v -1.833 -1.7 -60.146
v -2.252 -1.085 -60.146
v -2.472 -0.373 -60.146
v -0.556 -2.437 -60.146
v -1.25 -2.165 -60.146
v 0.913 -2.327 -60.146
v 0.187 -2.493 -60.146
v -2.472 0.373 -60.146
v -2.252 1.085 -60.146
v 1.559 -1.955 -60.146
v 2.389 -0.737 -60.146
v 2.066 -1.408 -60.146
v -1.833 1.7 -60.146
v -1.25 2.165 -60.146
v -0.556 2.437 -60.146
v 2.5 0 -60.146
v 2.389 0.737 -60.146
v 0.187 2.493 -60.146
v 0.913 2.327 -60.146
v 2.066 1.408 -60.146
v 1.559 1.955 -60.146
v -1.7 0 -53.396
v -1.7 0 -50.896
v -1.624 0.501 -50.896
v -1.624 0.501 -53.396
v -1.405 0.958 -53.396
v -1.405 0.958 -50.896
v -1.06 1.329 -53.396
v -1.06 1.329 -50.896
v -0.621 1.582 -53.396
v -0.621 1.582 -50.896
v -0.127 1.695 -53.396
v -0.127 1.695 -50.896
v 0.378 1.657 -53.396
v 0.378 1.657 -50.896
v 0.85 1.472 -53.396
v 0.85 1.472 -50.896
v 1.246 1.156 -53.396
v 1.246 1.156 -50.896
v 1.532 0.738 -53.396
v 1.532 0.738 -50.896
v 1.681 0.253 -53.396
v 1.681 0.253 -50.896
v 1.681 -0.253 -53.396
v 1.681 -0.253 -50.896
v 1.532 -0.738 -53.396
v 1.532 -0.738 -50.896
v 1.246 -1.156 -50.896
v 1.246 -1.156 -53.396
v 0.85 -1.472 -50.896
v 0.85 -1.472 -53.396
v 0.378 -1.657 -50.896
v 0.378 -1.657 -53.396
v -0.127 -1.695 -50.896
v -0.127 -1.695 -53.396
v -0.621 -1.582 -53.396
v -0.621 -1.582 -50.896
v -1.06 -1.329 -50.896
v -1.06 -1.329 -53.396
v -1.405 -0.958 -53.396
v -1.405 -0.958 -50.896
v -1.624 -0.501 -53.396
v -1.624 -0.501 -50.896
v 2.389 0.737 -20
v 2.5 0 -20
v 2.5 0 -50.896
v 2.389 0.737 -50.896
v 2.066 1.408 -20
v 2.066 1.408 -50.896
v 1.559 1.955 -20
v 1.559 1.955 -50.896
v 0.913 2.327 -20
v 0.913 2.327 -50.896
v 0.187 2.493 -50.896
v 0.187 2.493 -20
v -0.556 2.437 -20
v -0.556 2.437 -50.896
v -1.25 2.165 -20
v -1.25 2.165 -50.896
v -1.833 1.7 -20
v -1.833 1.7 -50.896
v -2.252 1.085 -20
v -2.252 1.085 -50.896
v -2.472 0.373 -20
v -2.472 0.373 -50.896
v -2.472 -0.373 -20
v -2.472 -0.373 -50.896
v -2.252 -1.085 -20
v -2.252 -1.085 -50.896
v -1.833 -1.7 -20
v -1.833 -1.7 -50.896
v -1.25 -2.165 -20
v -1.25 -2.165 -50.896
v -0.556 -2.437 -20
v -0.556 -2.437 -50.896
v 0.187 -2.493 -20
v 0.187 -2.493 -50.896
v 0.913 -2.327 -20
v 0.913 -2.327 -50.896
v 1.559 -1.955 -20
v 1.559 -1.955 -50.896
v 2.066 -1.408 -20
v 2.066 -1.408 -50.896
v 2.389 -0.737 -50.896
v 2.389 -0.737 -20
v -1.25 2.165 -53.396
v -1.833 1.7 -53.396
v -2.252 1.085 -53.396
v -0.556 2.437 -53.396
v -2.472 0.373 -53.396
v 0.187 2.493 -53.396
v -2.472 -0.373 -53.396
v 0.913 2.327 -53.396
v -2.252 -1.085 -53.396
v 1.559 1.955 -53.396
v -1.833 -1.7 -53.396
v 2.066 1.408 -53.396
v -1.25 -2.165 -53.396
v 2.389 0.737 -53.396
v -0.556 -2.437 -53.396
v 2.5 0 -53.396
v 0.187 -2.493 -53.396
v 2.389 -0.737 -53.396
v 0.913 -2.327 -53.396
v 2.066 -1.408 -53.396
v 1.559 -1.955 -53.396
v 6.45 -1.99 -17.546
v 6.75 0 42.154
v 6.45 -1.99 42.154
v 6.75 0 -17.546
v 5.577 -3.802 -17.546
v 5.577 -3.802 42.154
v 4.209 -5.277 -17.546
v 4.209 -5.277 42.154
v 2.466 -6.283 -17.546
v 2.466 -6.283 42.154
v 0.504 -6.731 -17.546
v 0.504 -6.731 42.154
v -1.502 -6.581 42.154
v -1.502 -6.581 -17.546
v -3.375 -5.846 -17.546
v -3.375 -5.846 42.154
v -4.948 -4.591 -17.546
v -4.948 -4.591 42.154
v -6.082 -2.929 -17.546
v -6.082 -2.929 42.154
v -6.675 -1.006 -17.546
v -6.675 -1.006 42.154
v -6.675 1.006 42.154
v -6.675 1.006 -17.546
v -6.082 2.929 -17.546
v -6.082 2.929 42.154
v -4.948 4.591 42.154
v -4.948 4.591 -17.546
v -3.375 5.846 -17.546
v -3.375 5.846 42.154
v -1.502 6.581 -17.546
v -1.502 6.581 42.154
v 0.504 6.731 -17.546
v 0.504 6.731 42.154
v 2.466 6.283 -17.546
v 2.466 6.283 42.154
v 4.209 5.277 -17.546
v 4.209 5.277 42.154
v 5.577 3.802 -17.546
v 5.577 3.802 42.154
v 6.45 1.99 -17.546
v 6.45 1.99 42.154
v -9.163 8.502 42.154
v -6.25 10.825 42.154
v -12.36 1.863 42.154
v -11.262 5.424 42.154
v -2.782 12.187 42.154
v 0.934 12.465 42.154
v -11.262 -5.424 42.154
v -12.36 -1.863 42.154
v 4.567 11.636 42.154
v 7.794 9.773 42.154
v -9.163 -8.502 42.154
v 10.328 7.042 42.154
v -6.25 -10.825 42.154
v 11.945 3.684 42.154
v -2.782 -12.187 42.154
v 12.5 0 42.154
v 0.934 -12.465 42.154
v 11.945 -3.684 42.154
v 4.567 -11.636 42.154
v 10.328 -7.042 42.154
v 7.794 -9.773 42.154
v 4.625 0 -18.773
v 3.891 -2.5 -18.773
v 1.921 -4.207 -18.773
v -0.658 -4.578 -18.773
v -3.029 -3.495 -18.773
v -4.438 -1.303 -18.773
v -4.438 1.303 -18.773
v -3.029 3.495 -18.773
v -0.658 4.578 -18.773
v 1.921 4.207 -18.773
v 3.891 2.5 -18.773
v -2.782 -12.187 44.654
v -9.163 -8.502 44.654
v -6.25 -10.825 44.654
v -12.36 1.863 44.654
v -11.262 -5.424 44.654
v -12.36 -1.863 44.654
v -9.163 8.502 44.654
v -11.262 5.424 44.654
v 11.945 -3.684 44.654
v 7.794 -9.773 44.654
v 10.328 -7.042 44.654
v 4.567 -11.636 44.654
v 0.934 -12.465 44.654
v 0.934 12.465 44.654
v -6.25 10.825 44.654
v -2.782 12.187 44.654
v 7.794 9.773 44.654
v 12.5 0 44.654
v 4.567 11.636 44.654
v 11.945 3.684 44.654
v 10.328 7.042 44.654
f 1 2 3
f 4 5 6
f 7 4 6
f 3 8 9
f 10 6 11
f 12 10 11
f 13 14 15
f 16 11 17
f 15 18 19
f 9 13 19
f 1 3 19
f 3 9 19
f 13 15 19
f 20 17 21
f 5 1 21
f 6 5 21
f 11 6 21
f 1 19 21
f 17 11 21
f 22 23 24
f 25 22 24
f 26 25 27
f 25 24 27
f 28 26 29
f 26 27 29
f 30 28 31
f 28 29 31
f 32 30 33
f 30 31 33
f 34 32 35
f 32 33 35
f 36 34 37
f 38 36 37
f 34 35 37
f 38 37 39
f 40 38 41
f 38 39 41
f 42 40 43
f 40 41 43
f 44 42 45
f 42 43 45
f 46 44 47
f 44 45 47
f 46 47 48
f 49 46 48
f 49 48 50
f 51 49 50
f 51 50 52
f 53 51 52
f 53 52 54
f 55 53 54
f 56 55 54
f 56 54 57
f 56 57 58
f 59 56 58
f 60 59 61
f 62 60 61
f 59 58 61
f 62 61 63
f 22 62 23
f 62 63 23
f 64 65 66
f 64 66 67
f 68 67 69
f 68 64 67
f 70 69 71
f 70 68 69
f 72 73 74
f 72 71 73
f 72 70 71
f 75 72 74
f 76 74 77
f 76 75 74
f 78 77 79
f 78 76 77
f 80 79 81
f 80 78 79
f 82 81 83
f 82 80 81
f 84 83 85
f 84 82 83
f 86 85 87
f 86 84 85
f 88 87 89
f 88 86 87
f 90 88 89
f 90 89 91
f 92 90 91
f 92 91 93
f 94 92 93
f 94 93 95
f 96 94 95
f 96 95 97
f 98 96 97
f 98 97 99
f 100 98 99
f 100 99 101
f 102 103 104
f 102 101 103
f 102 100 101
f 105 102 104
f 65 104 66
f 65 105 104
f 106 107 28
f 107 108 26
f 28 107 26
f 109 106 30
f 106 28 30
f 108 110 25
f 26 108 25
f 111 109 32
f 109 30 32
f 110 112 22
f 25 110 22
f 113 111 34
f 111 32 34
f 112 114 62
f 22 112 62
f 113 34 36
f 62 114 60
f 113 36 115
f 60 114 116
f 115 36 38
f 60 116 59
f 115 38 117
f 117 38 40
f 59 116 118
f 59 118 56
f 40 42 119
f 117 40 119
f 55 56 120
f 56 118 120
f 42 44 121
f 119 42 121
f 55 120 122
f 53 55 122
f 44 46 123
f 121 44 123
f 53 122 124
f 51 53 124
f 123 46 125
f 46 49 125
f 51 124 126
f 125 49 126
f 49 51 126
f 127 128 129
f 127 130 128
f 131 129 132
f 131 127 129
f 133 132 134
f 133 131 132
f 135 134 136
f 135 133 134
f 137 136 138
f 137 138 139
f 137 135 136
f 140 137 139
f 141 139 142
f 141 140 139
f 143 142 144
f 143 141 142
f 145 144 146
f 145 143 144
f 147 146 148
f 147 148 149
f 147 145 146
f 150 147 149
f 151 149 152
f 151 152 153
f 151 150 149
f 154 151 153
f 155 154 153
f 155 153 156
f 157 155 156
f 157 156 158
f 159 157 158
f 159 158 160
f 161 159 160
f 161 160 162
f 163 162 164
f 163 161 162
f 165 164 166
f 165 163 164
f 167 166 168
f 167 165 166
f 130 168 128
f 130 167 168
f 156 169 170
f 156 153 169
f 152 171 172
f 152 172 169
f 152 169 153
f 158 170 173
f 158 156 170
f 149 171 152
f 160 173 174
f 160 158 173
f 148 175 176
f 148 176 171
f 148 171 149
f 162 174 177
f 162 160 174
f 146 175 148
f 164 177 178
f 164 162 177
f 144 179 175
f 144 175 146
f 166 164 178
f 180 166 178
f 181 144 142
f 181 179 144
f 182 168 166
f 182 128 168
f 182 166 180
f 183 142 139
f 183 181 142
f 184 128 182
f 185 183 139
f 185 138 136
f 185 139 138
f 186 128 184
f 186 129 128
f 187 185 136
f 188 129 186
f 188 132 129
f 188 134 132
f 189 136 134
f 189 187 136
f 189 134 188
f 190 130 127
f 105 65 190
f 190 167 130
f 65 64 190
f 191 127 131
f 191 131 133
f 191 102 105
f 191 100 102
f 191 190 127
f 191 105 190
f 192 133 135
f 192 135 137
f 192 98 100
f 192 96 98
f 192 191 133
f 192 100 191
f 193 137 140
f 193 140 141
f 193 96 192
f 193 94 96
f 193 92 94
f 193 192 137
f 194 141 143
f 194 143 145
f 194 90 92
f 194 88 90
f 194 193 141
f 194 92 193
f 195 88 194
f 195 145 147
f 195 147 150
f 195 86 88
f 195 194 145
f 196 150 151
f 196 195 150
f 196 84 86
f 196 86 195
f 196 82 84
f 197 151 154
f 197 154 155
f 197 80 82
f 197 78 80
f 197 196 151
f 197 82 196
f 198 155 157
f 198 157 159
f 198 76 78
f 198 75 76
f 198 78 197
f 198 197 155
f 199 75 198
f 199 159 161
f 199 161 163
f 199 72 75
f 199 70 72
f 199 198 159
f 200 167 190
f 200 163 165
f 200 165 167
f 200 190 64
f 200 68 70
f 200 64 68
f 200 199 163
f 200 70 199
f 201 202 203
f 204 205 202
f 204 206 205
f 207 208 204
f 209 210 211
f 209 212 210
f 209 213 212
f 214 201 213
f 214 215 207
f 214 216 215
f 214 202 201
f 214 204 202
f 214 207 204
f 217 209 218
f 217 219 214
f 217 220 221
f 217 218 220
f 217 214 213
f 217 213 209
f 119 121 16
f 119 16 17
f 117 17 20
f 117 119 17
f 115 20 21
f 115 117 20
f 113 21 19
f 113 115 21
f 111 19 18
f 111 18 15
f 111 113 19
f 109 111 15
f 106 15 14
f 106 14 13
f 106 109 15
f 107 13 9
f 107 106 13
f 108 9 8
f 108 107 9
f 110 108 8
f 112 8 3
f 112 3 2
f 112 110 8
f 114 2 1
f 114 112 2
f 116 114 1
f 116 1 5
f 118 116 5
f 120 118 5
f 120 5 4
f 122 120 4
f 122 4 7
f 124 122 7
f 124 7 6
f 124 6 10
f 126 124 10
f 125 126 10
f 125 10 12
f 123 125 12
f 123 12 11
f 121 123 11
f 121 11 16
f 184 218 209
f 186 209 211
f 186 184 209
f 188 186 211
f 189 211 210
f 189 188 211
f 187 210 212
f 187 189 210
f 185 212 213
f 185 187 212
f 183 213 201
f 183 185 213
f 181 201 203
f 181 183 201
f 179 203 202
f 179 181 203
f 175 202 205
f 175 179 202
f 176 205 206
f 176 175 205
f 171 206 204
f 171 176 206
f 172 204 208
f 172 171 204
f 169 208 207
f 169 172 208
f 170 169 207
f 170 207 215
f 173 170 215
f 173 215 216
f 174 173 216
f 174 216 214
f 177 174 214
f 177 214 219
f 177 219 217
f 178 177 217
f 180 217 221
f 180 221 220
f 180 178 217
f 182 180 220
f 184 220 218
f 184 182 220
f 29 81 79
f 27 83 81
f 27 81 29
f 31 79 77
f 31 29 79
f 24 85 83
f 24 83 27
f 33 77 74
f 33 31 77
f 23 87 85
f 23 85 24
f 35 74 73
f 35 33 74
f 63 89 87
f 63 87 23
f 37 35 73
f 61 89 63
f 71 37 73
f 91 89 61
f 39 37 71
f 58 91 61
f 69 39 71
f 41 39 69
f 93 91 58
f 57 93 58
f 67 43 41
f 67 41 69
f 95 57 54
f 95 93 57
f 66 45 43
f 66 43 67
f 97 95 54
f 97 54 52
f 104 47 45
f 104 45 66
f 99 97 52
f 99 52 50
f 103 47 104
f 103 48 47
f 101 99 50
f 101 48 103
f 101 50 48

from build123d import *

# Parameters (mm, degrees)
ESBO_O2_R                = 12.5
ESBO_O2_R_2              = 6.75
CORTE_EXTRUS_O1_DEPTH    = 1.5
ESBO_O3_R                = 2.5
RESSALTO_EXTRUS_O1_DEPTH = 104.8
CORTE_EXTRUS_O2_START    = -2.5
ESBO_O4_R                = 2.5
ESBO_O4_R_2              = 1.7
CORTE_EXTRUS_O2_DEPTH    = 2.5


with BuildPart() as part:
    # Esboço1 → Revolução1 (revolve)
    with BuildSketch(Plane(origin=(0, 0, 0), x_dir=(0, 0, -1), z_dir=(1, 0, 0)), mode=Mode.PRIVATE) as revolu_o1_sk:
        Polygon((-44.653738644, 0), (-44.653738644, -12.5), (-40.653738644, -12.5), (-40.653738644, -6.75), (17.546261356, -6.75), (20, -2.5), (0, -2.5), (0, 0), align=None)
    revolve(revolu_o1_sk.sketch.rotate(Axis((0, 0, 72.391069924), (0, 0, -1)), 270), axis=Axis((0, 0, 72.391069924), (0, 0, -1)))

    # Esboço2 → Corte-extrusão1 (cut)
    with BuildSketch(Plane(origin=(0, 0, 40.653738644), x_dir=(-1, 0, 0), z_dir=(0, 0, -1))):
        with Locations(Location((0, 0, 0), (0, 0, 180))):
            Circle(ESBO_O2_R)
        with Locations(Location((0, 0, 0), (0, 0, 180))):
            Circle(ESBO_O2_R_2, mode=Mode.SUBTRACT)
    extrude(amount=-CORTE_EXTRUS_O1_DEPTH, mode=Mode.SUBTRACT)

    # Esboço3 → Ressalto-extrusão1 (add)
    with BuildSketch(Plane.XY.offset(44.653738644)):
        Circle(ESBO_O3_R)
    extrude(amount=-RESSALTO_EXTRUS_O1_DEPTH)

    # Esboço4 → Corte-extrusão2 (cut)
    with BuildSketch(Plane(origin=(0, 0, -53.396261356), x_dir=(-1, 0, 0), z_dir=(0, 0, -1)).offset(CORTE_EXTRUS_O2_START)):
        with Locations(Location((0, 0, 0), (0, 0, 180))):
            Circle(ESBO_O4_R)
        Circle(ESBO_O4_R_2, mode=Mode.SUBTRACT)
    extrude(amount=CORTE_EXTRUS_O2_DEPTH, mode=Mode.SUBTRACT)


solid = part.part
